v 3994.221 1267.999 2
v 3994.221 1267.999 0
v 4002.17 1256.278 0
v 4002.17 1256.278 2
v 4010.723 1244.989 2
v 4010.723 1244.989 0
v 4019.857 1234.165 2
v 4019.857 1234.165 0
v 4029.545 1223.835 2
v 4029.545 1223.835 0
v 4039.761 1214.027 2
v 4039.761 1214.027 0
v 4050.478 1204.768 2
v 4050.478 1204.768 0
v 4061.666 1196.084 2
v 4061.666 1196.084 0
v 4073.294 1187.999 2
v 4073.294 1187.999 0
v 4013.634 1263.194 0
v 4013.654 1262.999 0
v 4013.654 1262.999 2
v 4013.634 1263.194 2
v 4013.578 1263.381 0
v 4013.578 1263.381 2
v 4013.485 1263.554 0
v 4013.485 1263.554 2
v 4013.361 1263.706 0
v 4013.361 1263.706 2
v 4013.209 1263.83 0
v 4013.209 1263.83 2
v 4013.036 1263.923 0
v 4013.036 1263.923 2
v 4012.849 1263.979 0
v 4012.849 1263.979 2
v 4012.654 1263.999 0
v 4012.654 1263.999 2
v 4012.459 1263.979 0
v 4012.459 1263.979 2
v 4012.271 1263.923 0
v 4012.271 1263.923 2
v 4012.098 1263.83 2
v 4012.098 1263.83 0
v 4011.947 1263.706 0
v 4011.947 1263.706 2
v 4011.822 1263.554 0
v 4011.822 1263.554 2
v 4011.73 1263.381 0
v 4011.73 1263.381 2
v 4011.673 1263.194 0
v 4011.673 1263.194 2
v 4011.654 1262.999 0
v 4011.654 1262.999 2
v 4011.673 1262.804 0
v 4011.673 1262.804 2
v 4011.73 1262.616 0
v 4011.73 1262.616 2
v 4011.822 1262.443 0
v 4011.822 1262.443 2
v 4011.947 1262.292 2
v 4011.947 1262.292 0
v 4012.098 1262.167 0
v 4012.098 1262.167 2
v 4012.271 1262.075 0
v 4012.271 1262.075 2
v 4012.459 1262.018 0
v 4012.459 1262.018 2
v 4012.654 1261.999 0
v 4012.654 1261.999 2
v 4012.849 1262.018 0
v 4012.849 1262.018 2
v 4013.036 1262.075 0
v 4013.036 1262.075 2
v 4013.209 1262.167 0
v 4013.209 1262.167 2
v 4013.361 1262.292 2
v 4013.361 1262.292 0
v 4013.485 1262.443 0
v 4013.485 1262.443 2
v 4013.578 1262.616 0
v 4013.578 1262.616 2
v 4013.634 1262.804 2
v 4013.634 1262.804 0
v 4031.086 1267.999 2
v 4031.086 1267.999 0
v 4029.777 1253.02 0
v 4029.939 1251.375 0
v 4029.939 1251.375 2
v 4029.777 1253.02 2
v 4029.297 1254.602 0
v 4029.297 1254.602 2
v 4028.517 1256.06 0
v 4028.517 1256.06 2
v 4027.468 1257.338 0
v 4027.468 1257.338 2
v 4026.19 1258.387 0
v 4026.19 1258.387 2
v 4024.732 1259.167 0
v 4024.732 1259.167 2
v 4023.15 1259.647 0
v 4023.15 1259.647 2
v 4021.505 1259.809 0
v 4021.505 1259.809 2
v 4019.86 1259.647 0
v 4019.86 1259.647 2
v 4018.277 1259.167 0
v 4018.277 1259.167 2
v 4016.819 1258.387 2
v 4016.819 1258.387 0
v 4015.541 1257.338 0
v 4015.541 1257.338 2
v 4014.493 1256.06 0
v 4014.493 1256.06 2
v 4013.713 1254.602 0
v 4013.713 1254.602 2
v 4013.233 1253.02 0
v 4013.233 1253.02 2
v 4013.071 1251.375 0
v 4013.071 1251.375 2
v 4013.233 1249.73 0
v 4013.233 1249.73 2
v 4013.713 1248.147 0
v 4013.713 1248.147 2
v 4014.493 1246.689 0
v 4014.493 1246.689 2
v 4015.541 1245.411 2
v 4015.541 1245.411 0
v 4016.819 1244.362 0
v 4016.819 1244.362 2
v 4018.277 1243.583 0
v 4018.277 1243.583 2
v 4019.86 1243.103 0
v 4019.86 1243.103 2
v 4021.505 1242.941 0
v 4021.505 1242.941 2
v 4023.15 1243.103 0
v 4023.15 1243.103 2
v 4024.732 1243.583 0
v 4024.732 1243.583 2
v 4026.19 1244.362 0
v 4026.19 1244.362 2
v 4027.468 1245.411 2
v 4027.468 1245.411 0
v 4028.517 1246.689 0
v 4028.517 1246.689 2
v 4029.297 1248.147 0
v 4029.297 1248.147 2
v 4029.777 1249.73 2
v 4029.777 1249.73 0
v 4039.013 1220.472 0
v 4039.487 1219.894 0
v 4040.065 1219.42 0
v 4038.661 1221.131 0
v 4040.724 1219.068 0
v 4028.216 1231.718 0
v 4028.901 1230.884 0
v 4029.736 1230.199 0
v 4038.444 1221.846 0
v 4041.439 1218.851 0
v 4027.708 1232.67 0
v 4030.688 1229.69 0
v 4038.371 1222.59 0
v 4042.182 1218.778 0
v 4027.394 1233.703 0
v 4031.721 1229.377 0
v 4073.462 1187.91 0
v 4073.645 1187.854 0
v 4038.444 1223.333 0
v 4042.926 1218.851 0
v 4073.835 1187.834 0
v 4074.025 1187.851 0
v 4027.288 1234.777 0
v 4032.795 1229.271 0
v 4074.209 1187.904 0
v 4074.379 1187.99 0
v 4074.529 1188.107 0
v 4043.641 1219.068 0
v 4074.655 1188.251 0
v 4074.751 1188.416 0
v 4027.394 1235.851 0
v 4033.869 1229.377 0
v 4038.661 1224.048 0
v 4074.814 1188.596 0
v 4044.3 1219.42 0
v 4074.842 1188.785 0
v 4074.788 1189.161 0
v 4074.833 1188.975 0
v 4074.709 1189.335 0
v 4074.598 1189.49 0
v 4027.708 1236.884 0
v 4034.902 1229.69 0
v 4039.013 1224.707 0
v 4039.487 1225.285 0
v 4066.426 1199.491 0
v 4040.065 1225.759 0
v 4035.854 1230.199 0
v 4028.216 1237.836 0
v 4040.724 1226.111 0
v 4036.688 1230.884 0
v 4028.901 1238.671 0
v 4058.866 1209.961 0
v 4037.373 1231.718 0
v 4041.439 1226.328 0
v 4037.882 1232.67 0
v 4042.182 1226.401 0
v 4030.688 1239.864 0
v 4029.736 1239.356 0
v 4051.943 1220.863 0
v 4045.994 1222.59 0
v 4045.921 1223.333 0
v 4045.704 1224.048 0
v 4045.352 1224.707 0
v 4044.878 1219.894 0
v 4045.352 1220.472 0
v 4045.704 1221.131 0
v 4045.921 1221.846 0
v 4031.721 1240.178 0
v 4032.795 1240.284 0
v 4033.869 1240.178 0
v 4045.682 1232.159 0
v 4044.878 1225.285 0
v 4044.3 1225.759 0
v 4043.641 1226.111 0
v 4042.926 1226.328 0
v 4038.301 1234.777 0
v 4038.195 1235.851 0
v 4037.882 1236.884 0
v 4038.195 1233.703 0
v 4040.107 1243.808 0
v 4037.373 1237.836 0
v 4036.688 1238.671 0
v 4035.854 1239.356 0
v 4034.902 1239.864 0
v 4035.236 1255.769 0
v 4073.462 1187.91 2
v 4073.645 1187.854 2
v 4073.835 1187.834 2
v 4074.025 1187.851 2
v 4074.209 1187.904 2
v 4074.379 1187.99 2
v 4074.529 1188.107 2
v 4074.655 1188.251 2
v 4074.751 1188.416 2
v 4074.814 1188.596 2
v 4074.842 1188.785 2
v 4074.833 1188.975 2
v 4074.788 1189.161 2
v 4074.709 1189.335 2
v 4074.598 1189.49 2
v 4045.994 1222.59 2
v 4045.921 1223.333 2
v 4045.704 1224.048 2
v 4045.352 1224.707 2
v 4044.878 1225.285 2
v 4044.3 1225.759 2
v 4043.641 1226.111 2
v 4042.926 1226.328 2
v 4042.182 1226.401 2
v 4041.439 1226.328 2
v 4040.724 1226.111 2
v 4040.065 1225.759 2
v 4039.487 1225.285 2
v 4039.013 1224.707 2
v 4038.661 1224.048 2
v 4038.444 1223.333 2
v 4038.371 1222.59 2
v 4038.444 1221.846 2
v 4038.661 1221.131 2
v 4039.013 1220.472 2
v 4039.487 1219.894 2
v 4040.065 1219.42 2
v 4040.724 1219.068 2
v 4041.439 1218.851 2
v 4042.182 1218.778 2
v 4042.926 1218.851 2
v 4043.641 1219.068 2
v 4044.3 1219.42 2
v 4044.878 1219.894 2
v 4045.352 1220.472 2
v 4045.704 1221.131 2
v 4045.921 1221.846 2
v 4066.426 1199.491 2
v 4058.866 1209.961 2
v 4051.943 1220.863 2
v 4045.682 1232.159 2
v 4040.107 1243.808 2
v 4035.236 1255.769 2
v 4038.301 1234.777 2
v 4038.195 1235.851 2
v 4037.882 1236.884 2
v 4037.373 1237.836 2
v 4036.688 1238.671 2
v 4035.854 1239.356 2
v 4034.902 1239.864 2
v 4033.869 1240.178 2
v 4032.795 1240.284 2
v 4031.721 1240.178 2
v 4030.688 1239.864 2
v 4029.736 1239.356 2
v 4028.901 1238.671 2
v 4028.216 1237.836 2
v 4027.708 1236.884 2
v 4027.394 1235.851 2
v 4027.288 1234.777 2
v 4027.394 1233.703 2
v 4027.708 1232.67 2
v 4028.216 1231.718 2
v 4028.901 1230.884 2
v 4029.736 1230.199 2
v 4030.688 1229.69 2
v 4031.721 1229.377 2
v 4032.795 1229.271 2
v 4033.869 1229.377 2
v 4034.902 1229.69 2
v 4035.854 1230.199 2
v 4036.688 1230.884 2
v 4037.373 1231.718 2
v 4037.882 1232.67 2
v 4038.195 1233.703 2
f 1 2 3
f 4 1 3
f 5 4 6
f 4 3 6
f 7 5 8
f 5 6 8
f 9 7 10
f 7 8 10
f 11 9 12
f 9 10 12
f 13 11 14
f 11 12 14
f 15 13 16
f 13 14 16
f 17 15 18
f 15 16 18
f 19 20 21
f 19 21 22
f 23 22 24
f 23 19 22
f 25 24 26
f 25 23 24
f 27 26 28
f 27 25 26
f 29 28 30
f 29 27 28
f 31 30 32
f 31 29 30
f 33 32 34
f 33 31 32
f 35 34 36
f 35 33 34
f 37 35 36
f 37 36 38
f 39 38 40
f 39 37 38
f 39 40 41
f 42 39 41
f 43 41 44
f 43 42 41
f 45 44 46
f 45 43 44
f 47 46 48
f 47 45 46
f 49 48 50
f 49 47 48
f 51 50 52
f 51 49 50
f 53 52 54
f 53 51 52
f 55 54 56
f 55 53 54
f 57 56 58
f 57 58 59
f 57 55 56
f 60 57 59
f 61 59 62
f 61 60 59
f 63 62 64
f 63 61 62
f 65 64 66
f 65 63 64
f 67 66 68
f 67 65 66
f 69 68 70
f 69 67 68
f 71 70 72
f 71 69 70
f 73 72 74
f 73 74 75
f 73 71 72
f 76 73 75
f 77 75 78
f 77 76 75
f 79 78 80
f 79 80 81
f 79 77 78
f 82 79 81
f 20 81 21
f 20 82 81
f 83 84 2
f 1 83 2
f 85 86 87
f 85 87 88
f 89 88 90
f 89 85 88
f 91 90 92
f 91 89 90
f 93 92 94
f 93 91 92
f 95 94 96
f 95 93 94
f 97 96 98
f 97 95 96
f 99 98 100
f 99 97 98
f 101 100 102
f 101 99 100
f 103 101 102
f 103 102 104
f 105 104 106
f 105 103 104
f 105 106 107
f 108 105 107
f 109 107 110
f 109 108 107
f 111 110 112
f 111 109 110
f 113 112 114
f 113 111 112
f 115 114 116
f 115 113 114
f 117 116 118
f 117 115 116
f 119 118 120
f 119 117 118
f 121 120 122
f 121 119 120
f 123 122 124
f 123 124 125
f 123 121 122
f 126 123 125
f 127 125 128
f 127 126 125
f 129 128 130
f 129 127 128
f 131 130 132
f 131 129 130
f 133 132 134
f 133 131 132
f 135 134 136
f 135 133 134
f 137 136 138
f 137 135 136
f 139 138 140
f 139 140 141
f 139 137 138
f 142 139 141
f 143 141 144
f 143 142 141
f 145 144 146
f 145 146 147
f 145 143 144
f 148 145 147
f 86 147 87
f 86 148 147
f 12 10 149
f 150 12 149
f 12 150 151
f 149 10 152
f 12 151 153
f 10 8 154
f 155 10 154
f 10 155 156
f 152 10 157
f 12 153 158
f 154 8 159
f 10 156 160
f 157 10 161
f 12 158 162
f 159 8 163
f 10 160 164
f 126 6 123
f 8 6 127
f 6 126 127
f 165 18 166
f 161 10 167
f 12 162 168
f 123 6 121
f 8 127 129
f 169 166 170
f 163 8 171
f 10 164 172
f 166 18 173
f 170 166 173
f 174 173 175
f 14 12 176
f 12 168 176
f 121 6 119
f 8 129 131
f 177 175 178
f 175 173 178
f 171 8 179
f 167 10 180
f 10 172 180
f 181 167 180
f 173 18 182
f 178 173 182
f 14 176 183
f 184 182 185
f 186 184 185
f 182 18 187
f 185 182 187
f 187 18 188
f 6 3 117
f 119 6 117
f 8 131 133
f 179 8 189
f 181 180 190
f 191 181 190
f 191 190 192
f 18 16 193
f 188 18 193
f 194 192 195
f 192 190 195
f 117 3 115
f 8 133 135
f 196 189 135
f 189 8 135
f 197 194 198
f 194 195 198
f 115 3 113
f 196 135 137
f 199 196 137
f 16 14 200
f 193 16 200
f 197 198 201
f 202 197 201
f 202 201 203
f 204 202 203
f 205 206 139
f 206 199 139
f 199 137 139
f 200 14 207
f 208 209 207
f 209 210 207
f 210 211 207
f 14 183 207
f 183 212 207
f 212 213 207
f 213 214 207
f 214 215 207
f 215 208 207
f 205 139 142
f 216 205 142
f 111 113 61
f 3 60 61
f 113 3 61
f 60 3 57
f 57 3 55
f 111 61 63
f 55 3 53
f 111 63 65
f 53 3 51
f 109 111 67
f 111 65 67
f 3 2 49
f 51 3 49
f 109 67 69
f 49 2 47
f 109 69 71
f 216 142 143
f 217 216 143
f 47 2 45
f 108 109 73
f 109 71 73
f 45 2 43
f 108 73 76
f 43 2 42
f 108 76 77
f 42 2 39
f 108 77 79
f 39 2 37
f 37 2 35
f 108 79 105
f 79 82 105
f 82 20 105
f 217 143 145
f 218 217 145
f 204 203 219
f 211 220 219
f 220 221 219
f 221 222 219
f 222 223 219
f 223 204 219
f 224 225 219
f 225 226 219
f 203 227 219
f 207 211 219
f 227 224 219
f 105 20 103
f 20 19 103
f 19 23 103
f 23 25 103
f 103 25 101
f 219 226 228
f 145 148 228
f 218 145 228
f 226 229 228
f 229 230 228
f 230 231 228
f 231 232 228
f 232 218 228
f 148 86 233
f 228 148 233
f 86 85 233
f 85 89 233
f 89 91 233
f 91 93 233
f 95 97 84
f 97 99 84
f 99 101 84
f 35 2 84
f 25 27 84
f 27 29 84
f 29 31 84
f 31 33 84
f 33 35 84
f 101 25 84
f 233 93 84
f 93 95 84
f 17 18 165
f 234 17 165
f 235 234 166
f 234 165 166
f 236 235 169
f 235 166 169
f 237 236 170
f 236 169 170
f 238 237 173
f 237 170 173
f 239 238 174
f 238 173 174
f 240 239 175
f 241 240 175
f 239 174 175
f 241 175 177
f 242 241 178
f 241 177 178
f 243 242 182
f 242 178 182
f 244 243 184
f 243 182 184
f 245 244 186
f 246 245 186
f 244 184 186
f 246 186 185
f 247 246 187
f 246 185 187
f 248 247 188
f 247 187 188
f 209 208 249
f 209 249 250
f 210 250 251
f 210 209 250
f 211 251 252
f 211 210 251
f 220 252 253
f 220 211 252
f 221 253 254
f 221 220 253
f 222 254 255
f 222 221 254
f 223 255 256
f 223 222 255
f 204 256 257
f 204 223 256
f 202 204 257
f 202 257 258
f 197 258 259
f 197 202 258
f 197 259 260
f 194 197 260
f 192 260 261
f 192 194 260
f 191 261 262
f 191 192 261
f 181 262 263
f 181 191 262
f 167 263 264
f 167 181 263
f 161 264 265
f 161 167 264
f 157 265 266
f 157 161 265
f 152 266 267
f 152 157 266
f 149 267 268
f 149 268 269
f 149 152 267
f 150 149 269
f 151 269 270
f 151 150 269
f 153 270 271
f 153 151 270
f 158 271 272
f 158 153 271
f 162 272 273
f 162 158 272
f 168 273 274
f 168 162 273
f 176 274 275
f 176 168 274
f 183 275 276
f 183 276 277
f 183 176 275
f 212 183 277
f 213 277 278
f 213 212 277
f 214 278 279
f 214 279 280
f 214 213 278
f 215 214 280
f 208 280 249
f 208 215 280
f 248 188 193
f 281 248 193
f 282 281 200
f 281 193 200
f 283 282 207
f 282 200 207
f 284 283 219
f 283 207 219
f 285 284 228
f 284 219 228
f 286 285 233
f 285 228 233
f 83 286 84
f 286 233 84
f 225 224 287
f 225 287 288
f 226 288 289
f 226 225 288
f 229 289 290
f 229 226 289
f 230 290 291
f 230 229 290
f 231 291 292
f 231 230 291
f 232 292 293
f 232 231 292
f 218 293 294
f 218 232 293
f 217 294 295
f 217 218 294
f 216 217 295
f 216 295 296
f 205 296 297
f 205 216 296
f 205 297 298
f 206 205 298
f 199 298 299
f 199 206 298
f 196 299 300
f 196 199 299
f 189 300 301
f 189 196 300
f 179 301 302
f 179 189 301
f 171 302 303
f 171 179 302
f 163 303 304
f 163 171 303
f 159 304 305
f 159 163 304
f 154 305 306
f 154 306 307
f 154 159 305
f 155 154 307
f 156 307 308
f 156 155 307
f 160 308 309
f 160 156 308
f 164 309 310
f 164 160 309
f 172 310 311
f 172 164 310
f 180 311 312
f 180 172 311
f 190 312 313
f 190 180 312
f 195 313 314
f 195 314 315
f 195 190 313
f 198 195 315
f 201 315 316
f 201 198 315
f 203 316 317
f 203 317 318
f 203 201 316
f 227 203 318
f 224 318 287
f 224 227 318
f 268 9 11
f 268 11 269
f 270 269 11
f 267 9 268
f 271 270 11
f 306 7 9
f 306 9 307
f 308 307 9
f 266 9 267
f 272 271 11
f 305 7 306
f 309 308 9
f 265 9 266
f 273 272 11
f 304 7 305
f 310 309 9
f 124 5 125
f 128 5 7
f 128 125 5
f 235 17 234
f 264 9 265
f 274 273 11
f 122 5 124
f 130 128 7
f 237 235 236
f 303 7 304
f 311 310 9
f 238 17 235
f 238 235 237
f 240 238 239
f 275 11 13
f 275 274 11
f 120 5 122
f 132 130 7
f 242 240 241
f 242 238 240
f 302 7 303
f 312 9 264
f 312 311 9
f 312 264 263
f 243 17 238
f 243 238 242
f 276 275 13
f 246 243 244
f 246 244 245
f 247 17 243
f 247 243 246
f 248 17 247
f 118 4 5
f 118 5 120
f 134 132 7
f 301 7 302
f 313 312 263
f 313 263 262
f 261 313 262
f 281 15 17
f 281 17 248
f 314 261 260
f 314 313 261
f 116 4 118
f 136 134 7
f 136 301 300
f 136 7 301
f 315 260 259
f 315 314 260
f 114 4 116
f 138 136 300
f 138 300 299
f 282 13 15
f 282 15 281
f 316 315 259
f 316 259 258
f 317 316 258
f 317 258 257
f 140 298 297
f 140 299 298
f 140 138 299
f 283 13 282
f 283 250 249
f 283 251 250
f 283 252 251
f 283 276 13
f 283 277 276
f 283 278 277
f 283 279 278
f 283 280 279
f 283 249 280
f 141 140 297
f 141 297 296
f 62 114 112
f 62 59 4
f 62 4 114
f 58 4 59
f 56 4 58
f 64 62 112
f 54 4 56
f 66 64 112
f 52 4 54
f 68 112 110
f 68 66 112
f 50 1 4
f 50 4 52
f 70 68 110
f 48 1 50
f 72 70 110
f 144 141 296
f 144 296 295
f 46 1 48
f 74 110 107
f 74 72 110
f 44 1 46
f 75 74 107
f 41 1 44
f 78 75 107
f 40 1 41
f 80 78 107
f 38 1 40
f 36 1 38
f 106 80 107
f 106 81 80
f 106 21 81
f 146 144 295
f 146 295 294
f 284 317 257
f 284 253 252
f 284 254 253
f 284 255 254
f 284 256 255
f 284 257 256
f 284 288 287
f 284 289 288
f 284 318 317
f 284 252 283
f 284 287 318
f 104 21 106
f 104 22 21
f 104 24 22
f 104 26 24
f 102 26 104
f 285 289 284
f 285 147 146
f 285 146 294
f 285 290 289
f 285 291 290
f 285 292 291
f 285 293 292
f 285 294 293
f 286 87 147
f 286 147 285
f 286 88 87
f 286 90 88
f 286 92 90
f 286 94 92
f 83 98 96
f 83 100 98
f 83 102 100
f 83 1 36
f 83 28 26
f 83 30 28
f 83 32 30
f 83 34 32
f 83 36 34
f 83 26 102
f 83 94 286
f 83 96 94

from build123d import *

# Parameters (mm, degrees)
CROQUIS1_R              = 3.811830968
CROQUIS1_R_2            = 8.433713649
CROQUIS1_R_3            = 5.50644924
CROQUIS1_R_4            = 1
SALIENTE_EXTRUIR1_DEPTH = 2


with BuildPart() as part:
    # Croquis1 → Saliente-Extruir1 (new body)
    with BuildSketch(Plane.XY):
        with BuildLine():
            Line((4031.0864923, 1267.998645222), (3994.220839377, 1267.998645222))
            ThreePointArc((3994.220839377, 1267.998645222), (4029.544836626, 1223.835026243), (4073.293708821, 1187.998645222))
            ThreePointArc((4073.293708821, 1187.998645222), (4074.595594818, 1188.175999527), (4074.598031282, 1189.48990811))
            ThreePointArc((4074.598031282, 1189.48990811), (4048.728408118, 1226.464274325), (4031.0864923, 1267.998645222))
        make_face()
        with Locations((4042.182467754, 1222.589537582)):
            Circle(CROQUIS1_R, mode=Mode.SUBTRACT)
        with Locations((4021.504921686, 1251.374870701)):
            Circle(CROQUIS1_R_2, mode=Mode.SUBTRACT)
        with Locations((4032.794850615, 1234.777177731)):
            Circle(CROQUIS1_R_3, mode=Mode.SUBTRACT)
        with Locations((4012.653665839, 1262.998645222)):
            Circle(CROQUIS1_R_4, mode=Mode.SUBTRACT)
    extrude(amount=SALIENTE_EXTRUIR1_DEPTH)


solid = part.part
